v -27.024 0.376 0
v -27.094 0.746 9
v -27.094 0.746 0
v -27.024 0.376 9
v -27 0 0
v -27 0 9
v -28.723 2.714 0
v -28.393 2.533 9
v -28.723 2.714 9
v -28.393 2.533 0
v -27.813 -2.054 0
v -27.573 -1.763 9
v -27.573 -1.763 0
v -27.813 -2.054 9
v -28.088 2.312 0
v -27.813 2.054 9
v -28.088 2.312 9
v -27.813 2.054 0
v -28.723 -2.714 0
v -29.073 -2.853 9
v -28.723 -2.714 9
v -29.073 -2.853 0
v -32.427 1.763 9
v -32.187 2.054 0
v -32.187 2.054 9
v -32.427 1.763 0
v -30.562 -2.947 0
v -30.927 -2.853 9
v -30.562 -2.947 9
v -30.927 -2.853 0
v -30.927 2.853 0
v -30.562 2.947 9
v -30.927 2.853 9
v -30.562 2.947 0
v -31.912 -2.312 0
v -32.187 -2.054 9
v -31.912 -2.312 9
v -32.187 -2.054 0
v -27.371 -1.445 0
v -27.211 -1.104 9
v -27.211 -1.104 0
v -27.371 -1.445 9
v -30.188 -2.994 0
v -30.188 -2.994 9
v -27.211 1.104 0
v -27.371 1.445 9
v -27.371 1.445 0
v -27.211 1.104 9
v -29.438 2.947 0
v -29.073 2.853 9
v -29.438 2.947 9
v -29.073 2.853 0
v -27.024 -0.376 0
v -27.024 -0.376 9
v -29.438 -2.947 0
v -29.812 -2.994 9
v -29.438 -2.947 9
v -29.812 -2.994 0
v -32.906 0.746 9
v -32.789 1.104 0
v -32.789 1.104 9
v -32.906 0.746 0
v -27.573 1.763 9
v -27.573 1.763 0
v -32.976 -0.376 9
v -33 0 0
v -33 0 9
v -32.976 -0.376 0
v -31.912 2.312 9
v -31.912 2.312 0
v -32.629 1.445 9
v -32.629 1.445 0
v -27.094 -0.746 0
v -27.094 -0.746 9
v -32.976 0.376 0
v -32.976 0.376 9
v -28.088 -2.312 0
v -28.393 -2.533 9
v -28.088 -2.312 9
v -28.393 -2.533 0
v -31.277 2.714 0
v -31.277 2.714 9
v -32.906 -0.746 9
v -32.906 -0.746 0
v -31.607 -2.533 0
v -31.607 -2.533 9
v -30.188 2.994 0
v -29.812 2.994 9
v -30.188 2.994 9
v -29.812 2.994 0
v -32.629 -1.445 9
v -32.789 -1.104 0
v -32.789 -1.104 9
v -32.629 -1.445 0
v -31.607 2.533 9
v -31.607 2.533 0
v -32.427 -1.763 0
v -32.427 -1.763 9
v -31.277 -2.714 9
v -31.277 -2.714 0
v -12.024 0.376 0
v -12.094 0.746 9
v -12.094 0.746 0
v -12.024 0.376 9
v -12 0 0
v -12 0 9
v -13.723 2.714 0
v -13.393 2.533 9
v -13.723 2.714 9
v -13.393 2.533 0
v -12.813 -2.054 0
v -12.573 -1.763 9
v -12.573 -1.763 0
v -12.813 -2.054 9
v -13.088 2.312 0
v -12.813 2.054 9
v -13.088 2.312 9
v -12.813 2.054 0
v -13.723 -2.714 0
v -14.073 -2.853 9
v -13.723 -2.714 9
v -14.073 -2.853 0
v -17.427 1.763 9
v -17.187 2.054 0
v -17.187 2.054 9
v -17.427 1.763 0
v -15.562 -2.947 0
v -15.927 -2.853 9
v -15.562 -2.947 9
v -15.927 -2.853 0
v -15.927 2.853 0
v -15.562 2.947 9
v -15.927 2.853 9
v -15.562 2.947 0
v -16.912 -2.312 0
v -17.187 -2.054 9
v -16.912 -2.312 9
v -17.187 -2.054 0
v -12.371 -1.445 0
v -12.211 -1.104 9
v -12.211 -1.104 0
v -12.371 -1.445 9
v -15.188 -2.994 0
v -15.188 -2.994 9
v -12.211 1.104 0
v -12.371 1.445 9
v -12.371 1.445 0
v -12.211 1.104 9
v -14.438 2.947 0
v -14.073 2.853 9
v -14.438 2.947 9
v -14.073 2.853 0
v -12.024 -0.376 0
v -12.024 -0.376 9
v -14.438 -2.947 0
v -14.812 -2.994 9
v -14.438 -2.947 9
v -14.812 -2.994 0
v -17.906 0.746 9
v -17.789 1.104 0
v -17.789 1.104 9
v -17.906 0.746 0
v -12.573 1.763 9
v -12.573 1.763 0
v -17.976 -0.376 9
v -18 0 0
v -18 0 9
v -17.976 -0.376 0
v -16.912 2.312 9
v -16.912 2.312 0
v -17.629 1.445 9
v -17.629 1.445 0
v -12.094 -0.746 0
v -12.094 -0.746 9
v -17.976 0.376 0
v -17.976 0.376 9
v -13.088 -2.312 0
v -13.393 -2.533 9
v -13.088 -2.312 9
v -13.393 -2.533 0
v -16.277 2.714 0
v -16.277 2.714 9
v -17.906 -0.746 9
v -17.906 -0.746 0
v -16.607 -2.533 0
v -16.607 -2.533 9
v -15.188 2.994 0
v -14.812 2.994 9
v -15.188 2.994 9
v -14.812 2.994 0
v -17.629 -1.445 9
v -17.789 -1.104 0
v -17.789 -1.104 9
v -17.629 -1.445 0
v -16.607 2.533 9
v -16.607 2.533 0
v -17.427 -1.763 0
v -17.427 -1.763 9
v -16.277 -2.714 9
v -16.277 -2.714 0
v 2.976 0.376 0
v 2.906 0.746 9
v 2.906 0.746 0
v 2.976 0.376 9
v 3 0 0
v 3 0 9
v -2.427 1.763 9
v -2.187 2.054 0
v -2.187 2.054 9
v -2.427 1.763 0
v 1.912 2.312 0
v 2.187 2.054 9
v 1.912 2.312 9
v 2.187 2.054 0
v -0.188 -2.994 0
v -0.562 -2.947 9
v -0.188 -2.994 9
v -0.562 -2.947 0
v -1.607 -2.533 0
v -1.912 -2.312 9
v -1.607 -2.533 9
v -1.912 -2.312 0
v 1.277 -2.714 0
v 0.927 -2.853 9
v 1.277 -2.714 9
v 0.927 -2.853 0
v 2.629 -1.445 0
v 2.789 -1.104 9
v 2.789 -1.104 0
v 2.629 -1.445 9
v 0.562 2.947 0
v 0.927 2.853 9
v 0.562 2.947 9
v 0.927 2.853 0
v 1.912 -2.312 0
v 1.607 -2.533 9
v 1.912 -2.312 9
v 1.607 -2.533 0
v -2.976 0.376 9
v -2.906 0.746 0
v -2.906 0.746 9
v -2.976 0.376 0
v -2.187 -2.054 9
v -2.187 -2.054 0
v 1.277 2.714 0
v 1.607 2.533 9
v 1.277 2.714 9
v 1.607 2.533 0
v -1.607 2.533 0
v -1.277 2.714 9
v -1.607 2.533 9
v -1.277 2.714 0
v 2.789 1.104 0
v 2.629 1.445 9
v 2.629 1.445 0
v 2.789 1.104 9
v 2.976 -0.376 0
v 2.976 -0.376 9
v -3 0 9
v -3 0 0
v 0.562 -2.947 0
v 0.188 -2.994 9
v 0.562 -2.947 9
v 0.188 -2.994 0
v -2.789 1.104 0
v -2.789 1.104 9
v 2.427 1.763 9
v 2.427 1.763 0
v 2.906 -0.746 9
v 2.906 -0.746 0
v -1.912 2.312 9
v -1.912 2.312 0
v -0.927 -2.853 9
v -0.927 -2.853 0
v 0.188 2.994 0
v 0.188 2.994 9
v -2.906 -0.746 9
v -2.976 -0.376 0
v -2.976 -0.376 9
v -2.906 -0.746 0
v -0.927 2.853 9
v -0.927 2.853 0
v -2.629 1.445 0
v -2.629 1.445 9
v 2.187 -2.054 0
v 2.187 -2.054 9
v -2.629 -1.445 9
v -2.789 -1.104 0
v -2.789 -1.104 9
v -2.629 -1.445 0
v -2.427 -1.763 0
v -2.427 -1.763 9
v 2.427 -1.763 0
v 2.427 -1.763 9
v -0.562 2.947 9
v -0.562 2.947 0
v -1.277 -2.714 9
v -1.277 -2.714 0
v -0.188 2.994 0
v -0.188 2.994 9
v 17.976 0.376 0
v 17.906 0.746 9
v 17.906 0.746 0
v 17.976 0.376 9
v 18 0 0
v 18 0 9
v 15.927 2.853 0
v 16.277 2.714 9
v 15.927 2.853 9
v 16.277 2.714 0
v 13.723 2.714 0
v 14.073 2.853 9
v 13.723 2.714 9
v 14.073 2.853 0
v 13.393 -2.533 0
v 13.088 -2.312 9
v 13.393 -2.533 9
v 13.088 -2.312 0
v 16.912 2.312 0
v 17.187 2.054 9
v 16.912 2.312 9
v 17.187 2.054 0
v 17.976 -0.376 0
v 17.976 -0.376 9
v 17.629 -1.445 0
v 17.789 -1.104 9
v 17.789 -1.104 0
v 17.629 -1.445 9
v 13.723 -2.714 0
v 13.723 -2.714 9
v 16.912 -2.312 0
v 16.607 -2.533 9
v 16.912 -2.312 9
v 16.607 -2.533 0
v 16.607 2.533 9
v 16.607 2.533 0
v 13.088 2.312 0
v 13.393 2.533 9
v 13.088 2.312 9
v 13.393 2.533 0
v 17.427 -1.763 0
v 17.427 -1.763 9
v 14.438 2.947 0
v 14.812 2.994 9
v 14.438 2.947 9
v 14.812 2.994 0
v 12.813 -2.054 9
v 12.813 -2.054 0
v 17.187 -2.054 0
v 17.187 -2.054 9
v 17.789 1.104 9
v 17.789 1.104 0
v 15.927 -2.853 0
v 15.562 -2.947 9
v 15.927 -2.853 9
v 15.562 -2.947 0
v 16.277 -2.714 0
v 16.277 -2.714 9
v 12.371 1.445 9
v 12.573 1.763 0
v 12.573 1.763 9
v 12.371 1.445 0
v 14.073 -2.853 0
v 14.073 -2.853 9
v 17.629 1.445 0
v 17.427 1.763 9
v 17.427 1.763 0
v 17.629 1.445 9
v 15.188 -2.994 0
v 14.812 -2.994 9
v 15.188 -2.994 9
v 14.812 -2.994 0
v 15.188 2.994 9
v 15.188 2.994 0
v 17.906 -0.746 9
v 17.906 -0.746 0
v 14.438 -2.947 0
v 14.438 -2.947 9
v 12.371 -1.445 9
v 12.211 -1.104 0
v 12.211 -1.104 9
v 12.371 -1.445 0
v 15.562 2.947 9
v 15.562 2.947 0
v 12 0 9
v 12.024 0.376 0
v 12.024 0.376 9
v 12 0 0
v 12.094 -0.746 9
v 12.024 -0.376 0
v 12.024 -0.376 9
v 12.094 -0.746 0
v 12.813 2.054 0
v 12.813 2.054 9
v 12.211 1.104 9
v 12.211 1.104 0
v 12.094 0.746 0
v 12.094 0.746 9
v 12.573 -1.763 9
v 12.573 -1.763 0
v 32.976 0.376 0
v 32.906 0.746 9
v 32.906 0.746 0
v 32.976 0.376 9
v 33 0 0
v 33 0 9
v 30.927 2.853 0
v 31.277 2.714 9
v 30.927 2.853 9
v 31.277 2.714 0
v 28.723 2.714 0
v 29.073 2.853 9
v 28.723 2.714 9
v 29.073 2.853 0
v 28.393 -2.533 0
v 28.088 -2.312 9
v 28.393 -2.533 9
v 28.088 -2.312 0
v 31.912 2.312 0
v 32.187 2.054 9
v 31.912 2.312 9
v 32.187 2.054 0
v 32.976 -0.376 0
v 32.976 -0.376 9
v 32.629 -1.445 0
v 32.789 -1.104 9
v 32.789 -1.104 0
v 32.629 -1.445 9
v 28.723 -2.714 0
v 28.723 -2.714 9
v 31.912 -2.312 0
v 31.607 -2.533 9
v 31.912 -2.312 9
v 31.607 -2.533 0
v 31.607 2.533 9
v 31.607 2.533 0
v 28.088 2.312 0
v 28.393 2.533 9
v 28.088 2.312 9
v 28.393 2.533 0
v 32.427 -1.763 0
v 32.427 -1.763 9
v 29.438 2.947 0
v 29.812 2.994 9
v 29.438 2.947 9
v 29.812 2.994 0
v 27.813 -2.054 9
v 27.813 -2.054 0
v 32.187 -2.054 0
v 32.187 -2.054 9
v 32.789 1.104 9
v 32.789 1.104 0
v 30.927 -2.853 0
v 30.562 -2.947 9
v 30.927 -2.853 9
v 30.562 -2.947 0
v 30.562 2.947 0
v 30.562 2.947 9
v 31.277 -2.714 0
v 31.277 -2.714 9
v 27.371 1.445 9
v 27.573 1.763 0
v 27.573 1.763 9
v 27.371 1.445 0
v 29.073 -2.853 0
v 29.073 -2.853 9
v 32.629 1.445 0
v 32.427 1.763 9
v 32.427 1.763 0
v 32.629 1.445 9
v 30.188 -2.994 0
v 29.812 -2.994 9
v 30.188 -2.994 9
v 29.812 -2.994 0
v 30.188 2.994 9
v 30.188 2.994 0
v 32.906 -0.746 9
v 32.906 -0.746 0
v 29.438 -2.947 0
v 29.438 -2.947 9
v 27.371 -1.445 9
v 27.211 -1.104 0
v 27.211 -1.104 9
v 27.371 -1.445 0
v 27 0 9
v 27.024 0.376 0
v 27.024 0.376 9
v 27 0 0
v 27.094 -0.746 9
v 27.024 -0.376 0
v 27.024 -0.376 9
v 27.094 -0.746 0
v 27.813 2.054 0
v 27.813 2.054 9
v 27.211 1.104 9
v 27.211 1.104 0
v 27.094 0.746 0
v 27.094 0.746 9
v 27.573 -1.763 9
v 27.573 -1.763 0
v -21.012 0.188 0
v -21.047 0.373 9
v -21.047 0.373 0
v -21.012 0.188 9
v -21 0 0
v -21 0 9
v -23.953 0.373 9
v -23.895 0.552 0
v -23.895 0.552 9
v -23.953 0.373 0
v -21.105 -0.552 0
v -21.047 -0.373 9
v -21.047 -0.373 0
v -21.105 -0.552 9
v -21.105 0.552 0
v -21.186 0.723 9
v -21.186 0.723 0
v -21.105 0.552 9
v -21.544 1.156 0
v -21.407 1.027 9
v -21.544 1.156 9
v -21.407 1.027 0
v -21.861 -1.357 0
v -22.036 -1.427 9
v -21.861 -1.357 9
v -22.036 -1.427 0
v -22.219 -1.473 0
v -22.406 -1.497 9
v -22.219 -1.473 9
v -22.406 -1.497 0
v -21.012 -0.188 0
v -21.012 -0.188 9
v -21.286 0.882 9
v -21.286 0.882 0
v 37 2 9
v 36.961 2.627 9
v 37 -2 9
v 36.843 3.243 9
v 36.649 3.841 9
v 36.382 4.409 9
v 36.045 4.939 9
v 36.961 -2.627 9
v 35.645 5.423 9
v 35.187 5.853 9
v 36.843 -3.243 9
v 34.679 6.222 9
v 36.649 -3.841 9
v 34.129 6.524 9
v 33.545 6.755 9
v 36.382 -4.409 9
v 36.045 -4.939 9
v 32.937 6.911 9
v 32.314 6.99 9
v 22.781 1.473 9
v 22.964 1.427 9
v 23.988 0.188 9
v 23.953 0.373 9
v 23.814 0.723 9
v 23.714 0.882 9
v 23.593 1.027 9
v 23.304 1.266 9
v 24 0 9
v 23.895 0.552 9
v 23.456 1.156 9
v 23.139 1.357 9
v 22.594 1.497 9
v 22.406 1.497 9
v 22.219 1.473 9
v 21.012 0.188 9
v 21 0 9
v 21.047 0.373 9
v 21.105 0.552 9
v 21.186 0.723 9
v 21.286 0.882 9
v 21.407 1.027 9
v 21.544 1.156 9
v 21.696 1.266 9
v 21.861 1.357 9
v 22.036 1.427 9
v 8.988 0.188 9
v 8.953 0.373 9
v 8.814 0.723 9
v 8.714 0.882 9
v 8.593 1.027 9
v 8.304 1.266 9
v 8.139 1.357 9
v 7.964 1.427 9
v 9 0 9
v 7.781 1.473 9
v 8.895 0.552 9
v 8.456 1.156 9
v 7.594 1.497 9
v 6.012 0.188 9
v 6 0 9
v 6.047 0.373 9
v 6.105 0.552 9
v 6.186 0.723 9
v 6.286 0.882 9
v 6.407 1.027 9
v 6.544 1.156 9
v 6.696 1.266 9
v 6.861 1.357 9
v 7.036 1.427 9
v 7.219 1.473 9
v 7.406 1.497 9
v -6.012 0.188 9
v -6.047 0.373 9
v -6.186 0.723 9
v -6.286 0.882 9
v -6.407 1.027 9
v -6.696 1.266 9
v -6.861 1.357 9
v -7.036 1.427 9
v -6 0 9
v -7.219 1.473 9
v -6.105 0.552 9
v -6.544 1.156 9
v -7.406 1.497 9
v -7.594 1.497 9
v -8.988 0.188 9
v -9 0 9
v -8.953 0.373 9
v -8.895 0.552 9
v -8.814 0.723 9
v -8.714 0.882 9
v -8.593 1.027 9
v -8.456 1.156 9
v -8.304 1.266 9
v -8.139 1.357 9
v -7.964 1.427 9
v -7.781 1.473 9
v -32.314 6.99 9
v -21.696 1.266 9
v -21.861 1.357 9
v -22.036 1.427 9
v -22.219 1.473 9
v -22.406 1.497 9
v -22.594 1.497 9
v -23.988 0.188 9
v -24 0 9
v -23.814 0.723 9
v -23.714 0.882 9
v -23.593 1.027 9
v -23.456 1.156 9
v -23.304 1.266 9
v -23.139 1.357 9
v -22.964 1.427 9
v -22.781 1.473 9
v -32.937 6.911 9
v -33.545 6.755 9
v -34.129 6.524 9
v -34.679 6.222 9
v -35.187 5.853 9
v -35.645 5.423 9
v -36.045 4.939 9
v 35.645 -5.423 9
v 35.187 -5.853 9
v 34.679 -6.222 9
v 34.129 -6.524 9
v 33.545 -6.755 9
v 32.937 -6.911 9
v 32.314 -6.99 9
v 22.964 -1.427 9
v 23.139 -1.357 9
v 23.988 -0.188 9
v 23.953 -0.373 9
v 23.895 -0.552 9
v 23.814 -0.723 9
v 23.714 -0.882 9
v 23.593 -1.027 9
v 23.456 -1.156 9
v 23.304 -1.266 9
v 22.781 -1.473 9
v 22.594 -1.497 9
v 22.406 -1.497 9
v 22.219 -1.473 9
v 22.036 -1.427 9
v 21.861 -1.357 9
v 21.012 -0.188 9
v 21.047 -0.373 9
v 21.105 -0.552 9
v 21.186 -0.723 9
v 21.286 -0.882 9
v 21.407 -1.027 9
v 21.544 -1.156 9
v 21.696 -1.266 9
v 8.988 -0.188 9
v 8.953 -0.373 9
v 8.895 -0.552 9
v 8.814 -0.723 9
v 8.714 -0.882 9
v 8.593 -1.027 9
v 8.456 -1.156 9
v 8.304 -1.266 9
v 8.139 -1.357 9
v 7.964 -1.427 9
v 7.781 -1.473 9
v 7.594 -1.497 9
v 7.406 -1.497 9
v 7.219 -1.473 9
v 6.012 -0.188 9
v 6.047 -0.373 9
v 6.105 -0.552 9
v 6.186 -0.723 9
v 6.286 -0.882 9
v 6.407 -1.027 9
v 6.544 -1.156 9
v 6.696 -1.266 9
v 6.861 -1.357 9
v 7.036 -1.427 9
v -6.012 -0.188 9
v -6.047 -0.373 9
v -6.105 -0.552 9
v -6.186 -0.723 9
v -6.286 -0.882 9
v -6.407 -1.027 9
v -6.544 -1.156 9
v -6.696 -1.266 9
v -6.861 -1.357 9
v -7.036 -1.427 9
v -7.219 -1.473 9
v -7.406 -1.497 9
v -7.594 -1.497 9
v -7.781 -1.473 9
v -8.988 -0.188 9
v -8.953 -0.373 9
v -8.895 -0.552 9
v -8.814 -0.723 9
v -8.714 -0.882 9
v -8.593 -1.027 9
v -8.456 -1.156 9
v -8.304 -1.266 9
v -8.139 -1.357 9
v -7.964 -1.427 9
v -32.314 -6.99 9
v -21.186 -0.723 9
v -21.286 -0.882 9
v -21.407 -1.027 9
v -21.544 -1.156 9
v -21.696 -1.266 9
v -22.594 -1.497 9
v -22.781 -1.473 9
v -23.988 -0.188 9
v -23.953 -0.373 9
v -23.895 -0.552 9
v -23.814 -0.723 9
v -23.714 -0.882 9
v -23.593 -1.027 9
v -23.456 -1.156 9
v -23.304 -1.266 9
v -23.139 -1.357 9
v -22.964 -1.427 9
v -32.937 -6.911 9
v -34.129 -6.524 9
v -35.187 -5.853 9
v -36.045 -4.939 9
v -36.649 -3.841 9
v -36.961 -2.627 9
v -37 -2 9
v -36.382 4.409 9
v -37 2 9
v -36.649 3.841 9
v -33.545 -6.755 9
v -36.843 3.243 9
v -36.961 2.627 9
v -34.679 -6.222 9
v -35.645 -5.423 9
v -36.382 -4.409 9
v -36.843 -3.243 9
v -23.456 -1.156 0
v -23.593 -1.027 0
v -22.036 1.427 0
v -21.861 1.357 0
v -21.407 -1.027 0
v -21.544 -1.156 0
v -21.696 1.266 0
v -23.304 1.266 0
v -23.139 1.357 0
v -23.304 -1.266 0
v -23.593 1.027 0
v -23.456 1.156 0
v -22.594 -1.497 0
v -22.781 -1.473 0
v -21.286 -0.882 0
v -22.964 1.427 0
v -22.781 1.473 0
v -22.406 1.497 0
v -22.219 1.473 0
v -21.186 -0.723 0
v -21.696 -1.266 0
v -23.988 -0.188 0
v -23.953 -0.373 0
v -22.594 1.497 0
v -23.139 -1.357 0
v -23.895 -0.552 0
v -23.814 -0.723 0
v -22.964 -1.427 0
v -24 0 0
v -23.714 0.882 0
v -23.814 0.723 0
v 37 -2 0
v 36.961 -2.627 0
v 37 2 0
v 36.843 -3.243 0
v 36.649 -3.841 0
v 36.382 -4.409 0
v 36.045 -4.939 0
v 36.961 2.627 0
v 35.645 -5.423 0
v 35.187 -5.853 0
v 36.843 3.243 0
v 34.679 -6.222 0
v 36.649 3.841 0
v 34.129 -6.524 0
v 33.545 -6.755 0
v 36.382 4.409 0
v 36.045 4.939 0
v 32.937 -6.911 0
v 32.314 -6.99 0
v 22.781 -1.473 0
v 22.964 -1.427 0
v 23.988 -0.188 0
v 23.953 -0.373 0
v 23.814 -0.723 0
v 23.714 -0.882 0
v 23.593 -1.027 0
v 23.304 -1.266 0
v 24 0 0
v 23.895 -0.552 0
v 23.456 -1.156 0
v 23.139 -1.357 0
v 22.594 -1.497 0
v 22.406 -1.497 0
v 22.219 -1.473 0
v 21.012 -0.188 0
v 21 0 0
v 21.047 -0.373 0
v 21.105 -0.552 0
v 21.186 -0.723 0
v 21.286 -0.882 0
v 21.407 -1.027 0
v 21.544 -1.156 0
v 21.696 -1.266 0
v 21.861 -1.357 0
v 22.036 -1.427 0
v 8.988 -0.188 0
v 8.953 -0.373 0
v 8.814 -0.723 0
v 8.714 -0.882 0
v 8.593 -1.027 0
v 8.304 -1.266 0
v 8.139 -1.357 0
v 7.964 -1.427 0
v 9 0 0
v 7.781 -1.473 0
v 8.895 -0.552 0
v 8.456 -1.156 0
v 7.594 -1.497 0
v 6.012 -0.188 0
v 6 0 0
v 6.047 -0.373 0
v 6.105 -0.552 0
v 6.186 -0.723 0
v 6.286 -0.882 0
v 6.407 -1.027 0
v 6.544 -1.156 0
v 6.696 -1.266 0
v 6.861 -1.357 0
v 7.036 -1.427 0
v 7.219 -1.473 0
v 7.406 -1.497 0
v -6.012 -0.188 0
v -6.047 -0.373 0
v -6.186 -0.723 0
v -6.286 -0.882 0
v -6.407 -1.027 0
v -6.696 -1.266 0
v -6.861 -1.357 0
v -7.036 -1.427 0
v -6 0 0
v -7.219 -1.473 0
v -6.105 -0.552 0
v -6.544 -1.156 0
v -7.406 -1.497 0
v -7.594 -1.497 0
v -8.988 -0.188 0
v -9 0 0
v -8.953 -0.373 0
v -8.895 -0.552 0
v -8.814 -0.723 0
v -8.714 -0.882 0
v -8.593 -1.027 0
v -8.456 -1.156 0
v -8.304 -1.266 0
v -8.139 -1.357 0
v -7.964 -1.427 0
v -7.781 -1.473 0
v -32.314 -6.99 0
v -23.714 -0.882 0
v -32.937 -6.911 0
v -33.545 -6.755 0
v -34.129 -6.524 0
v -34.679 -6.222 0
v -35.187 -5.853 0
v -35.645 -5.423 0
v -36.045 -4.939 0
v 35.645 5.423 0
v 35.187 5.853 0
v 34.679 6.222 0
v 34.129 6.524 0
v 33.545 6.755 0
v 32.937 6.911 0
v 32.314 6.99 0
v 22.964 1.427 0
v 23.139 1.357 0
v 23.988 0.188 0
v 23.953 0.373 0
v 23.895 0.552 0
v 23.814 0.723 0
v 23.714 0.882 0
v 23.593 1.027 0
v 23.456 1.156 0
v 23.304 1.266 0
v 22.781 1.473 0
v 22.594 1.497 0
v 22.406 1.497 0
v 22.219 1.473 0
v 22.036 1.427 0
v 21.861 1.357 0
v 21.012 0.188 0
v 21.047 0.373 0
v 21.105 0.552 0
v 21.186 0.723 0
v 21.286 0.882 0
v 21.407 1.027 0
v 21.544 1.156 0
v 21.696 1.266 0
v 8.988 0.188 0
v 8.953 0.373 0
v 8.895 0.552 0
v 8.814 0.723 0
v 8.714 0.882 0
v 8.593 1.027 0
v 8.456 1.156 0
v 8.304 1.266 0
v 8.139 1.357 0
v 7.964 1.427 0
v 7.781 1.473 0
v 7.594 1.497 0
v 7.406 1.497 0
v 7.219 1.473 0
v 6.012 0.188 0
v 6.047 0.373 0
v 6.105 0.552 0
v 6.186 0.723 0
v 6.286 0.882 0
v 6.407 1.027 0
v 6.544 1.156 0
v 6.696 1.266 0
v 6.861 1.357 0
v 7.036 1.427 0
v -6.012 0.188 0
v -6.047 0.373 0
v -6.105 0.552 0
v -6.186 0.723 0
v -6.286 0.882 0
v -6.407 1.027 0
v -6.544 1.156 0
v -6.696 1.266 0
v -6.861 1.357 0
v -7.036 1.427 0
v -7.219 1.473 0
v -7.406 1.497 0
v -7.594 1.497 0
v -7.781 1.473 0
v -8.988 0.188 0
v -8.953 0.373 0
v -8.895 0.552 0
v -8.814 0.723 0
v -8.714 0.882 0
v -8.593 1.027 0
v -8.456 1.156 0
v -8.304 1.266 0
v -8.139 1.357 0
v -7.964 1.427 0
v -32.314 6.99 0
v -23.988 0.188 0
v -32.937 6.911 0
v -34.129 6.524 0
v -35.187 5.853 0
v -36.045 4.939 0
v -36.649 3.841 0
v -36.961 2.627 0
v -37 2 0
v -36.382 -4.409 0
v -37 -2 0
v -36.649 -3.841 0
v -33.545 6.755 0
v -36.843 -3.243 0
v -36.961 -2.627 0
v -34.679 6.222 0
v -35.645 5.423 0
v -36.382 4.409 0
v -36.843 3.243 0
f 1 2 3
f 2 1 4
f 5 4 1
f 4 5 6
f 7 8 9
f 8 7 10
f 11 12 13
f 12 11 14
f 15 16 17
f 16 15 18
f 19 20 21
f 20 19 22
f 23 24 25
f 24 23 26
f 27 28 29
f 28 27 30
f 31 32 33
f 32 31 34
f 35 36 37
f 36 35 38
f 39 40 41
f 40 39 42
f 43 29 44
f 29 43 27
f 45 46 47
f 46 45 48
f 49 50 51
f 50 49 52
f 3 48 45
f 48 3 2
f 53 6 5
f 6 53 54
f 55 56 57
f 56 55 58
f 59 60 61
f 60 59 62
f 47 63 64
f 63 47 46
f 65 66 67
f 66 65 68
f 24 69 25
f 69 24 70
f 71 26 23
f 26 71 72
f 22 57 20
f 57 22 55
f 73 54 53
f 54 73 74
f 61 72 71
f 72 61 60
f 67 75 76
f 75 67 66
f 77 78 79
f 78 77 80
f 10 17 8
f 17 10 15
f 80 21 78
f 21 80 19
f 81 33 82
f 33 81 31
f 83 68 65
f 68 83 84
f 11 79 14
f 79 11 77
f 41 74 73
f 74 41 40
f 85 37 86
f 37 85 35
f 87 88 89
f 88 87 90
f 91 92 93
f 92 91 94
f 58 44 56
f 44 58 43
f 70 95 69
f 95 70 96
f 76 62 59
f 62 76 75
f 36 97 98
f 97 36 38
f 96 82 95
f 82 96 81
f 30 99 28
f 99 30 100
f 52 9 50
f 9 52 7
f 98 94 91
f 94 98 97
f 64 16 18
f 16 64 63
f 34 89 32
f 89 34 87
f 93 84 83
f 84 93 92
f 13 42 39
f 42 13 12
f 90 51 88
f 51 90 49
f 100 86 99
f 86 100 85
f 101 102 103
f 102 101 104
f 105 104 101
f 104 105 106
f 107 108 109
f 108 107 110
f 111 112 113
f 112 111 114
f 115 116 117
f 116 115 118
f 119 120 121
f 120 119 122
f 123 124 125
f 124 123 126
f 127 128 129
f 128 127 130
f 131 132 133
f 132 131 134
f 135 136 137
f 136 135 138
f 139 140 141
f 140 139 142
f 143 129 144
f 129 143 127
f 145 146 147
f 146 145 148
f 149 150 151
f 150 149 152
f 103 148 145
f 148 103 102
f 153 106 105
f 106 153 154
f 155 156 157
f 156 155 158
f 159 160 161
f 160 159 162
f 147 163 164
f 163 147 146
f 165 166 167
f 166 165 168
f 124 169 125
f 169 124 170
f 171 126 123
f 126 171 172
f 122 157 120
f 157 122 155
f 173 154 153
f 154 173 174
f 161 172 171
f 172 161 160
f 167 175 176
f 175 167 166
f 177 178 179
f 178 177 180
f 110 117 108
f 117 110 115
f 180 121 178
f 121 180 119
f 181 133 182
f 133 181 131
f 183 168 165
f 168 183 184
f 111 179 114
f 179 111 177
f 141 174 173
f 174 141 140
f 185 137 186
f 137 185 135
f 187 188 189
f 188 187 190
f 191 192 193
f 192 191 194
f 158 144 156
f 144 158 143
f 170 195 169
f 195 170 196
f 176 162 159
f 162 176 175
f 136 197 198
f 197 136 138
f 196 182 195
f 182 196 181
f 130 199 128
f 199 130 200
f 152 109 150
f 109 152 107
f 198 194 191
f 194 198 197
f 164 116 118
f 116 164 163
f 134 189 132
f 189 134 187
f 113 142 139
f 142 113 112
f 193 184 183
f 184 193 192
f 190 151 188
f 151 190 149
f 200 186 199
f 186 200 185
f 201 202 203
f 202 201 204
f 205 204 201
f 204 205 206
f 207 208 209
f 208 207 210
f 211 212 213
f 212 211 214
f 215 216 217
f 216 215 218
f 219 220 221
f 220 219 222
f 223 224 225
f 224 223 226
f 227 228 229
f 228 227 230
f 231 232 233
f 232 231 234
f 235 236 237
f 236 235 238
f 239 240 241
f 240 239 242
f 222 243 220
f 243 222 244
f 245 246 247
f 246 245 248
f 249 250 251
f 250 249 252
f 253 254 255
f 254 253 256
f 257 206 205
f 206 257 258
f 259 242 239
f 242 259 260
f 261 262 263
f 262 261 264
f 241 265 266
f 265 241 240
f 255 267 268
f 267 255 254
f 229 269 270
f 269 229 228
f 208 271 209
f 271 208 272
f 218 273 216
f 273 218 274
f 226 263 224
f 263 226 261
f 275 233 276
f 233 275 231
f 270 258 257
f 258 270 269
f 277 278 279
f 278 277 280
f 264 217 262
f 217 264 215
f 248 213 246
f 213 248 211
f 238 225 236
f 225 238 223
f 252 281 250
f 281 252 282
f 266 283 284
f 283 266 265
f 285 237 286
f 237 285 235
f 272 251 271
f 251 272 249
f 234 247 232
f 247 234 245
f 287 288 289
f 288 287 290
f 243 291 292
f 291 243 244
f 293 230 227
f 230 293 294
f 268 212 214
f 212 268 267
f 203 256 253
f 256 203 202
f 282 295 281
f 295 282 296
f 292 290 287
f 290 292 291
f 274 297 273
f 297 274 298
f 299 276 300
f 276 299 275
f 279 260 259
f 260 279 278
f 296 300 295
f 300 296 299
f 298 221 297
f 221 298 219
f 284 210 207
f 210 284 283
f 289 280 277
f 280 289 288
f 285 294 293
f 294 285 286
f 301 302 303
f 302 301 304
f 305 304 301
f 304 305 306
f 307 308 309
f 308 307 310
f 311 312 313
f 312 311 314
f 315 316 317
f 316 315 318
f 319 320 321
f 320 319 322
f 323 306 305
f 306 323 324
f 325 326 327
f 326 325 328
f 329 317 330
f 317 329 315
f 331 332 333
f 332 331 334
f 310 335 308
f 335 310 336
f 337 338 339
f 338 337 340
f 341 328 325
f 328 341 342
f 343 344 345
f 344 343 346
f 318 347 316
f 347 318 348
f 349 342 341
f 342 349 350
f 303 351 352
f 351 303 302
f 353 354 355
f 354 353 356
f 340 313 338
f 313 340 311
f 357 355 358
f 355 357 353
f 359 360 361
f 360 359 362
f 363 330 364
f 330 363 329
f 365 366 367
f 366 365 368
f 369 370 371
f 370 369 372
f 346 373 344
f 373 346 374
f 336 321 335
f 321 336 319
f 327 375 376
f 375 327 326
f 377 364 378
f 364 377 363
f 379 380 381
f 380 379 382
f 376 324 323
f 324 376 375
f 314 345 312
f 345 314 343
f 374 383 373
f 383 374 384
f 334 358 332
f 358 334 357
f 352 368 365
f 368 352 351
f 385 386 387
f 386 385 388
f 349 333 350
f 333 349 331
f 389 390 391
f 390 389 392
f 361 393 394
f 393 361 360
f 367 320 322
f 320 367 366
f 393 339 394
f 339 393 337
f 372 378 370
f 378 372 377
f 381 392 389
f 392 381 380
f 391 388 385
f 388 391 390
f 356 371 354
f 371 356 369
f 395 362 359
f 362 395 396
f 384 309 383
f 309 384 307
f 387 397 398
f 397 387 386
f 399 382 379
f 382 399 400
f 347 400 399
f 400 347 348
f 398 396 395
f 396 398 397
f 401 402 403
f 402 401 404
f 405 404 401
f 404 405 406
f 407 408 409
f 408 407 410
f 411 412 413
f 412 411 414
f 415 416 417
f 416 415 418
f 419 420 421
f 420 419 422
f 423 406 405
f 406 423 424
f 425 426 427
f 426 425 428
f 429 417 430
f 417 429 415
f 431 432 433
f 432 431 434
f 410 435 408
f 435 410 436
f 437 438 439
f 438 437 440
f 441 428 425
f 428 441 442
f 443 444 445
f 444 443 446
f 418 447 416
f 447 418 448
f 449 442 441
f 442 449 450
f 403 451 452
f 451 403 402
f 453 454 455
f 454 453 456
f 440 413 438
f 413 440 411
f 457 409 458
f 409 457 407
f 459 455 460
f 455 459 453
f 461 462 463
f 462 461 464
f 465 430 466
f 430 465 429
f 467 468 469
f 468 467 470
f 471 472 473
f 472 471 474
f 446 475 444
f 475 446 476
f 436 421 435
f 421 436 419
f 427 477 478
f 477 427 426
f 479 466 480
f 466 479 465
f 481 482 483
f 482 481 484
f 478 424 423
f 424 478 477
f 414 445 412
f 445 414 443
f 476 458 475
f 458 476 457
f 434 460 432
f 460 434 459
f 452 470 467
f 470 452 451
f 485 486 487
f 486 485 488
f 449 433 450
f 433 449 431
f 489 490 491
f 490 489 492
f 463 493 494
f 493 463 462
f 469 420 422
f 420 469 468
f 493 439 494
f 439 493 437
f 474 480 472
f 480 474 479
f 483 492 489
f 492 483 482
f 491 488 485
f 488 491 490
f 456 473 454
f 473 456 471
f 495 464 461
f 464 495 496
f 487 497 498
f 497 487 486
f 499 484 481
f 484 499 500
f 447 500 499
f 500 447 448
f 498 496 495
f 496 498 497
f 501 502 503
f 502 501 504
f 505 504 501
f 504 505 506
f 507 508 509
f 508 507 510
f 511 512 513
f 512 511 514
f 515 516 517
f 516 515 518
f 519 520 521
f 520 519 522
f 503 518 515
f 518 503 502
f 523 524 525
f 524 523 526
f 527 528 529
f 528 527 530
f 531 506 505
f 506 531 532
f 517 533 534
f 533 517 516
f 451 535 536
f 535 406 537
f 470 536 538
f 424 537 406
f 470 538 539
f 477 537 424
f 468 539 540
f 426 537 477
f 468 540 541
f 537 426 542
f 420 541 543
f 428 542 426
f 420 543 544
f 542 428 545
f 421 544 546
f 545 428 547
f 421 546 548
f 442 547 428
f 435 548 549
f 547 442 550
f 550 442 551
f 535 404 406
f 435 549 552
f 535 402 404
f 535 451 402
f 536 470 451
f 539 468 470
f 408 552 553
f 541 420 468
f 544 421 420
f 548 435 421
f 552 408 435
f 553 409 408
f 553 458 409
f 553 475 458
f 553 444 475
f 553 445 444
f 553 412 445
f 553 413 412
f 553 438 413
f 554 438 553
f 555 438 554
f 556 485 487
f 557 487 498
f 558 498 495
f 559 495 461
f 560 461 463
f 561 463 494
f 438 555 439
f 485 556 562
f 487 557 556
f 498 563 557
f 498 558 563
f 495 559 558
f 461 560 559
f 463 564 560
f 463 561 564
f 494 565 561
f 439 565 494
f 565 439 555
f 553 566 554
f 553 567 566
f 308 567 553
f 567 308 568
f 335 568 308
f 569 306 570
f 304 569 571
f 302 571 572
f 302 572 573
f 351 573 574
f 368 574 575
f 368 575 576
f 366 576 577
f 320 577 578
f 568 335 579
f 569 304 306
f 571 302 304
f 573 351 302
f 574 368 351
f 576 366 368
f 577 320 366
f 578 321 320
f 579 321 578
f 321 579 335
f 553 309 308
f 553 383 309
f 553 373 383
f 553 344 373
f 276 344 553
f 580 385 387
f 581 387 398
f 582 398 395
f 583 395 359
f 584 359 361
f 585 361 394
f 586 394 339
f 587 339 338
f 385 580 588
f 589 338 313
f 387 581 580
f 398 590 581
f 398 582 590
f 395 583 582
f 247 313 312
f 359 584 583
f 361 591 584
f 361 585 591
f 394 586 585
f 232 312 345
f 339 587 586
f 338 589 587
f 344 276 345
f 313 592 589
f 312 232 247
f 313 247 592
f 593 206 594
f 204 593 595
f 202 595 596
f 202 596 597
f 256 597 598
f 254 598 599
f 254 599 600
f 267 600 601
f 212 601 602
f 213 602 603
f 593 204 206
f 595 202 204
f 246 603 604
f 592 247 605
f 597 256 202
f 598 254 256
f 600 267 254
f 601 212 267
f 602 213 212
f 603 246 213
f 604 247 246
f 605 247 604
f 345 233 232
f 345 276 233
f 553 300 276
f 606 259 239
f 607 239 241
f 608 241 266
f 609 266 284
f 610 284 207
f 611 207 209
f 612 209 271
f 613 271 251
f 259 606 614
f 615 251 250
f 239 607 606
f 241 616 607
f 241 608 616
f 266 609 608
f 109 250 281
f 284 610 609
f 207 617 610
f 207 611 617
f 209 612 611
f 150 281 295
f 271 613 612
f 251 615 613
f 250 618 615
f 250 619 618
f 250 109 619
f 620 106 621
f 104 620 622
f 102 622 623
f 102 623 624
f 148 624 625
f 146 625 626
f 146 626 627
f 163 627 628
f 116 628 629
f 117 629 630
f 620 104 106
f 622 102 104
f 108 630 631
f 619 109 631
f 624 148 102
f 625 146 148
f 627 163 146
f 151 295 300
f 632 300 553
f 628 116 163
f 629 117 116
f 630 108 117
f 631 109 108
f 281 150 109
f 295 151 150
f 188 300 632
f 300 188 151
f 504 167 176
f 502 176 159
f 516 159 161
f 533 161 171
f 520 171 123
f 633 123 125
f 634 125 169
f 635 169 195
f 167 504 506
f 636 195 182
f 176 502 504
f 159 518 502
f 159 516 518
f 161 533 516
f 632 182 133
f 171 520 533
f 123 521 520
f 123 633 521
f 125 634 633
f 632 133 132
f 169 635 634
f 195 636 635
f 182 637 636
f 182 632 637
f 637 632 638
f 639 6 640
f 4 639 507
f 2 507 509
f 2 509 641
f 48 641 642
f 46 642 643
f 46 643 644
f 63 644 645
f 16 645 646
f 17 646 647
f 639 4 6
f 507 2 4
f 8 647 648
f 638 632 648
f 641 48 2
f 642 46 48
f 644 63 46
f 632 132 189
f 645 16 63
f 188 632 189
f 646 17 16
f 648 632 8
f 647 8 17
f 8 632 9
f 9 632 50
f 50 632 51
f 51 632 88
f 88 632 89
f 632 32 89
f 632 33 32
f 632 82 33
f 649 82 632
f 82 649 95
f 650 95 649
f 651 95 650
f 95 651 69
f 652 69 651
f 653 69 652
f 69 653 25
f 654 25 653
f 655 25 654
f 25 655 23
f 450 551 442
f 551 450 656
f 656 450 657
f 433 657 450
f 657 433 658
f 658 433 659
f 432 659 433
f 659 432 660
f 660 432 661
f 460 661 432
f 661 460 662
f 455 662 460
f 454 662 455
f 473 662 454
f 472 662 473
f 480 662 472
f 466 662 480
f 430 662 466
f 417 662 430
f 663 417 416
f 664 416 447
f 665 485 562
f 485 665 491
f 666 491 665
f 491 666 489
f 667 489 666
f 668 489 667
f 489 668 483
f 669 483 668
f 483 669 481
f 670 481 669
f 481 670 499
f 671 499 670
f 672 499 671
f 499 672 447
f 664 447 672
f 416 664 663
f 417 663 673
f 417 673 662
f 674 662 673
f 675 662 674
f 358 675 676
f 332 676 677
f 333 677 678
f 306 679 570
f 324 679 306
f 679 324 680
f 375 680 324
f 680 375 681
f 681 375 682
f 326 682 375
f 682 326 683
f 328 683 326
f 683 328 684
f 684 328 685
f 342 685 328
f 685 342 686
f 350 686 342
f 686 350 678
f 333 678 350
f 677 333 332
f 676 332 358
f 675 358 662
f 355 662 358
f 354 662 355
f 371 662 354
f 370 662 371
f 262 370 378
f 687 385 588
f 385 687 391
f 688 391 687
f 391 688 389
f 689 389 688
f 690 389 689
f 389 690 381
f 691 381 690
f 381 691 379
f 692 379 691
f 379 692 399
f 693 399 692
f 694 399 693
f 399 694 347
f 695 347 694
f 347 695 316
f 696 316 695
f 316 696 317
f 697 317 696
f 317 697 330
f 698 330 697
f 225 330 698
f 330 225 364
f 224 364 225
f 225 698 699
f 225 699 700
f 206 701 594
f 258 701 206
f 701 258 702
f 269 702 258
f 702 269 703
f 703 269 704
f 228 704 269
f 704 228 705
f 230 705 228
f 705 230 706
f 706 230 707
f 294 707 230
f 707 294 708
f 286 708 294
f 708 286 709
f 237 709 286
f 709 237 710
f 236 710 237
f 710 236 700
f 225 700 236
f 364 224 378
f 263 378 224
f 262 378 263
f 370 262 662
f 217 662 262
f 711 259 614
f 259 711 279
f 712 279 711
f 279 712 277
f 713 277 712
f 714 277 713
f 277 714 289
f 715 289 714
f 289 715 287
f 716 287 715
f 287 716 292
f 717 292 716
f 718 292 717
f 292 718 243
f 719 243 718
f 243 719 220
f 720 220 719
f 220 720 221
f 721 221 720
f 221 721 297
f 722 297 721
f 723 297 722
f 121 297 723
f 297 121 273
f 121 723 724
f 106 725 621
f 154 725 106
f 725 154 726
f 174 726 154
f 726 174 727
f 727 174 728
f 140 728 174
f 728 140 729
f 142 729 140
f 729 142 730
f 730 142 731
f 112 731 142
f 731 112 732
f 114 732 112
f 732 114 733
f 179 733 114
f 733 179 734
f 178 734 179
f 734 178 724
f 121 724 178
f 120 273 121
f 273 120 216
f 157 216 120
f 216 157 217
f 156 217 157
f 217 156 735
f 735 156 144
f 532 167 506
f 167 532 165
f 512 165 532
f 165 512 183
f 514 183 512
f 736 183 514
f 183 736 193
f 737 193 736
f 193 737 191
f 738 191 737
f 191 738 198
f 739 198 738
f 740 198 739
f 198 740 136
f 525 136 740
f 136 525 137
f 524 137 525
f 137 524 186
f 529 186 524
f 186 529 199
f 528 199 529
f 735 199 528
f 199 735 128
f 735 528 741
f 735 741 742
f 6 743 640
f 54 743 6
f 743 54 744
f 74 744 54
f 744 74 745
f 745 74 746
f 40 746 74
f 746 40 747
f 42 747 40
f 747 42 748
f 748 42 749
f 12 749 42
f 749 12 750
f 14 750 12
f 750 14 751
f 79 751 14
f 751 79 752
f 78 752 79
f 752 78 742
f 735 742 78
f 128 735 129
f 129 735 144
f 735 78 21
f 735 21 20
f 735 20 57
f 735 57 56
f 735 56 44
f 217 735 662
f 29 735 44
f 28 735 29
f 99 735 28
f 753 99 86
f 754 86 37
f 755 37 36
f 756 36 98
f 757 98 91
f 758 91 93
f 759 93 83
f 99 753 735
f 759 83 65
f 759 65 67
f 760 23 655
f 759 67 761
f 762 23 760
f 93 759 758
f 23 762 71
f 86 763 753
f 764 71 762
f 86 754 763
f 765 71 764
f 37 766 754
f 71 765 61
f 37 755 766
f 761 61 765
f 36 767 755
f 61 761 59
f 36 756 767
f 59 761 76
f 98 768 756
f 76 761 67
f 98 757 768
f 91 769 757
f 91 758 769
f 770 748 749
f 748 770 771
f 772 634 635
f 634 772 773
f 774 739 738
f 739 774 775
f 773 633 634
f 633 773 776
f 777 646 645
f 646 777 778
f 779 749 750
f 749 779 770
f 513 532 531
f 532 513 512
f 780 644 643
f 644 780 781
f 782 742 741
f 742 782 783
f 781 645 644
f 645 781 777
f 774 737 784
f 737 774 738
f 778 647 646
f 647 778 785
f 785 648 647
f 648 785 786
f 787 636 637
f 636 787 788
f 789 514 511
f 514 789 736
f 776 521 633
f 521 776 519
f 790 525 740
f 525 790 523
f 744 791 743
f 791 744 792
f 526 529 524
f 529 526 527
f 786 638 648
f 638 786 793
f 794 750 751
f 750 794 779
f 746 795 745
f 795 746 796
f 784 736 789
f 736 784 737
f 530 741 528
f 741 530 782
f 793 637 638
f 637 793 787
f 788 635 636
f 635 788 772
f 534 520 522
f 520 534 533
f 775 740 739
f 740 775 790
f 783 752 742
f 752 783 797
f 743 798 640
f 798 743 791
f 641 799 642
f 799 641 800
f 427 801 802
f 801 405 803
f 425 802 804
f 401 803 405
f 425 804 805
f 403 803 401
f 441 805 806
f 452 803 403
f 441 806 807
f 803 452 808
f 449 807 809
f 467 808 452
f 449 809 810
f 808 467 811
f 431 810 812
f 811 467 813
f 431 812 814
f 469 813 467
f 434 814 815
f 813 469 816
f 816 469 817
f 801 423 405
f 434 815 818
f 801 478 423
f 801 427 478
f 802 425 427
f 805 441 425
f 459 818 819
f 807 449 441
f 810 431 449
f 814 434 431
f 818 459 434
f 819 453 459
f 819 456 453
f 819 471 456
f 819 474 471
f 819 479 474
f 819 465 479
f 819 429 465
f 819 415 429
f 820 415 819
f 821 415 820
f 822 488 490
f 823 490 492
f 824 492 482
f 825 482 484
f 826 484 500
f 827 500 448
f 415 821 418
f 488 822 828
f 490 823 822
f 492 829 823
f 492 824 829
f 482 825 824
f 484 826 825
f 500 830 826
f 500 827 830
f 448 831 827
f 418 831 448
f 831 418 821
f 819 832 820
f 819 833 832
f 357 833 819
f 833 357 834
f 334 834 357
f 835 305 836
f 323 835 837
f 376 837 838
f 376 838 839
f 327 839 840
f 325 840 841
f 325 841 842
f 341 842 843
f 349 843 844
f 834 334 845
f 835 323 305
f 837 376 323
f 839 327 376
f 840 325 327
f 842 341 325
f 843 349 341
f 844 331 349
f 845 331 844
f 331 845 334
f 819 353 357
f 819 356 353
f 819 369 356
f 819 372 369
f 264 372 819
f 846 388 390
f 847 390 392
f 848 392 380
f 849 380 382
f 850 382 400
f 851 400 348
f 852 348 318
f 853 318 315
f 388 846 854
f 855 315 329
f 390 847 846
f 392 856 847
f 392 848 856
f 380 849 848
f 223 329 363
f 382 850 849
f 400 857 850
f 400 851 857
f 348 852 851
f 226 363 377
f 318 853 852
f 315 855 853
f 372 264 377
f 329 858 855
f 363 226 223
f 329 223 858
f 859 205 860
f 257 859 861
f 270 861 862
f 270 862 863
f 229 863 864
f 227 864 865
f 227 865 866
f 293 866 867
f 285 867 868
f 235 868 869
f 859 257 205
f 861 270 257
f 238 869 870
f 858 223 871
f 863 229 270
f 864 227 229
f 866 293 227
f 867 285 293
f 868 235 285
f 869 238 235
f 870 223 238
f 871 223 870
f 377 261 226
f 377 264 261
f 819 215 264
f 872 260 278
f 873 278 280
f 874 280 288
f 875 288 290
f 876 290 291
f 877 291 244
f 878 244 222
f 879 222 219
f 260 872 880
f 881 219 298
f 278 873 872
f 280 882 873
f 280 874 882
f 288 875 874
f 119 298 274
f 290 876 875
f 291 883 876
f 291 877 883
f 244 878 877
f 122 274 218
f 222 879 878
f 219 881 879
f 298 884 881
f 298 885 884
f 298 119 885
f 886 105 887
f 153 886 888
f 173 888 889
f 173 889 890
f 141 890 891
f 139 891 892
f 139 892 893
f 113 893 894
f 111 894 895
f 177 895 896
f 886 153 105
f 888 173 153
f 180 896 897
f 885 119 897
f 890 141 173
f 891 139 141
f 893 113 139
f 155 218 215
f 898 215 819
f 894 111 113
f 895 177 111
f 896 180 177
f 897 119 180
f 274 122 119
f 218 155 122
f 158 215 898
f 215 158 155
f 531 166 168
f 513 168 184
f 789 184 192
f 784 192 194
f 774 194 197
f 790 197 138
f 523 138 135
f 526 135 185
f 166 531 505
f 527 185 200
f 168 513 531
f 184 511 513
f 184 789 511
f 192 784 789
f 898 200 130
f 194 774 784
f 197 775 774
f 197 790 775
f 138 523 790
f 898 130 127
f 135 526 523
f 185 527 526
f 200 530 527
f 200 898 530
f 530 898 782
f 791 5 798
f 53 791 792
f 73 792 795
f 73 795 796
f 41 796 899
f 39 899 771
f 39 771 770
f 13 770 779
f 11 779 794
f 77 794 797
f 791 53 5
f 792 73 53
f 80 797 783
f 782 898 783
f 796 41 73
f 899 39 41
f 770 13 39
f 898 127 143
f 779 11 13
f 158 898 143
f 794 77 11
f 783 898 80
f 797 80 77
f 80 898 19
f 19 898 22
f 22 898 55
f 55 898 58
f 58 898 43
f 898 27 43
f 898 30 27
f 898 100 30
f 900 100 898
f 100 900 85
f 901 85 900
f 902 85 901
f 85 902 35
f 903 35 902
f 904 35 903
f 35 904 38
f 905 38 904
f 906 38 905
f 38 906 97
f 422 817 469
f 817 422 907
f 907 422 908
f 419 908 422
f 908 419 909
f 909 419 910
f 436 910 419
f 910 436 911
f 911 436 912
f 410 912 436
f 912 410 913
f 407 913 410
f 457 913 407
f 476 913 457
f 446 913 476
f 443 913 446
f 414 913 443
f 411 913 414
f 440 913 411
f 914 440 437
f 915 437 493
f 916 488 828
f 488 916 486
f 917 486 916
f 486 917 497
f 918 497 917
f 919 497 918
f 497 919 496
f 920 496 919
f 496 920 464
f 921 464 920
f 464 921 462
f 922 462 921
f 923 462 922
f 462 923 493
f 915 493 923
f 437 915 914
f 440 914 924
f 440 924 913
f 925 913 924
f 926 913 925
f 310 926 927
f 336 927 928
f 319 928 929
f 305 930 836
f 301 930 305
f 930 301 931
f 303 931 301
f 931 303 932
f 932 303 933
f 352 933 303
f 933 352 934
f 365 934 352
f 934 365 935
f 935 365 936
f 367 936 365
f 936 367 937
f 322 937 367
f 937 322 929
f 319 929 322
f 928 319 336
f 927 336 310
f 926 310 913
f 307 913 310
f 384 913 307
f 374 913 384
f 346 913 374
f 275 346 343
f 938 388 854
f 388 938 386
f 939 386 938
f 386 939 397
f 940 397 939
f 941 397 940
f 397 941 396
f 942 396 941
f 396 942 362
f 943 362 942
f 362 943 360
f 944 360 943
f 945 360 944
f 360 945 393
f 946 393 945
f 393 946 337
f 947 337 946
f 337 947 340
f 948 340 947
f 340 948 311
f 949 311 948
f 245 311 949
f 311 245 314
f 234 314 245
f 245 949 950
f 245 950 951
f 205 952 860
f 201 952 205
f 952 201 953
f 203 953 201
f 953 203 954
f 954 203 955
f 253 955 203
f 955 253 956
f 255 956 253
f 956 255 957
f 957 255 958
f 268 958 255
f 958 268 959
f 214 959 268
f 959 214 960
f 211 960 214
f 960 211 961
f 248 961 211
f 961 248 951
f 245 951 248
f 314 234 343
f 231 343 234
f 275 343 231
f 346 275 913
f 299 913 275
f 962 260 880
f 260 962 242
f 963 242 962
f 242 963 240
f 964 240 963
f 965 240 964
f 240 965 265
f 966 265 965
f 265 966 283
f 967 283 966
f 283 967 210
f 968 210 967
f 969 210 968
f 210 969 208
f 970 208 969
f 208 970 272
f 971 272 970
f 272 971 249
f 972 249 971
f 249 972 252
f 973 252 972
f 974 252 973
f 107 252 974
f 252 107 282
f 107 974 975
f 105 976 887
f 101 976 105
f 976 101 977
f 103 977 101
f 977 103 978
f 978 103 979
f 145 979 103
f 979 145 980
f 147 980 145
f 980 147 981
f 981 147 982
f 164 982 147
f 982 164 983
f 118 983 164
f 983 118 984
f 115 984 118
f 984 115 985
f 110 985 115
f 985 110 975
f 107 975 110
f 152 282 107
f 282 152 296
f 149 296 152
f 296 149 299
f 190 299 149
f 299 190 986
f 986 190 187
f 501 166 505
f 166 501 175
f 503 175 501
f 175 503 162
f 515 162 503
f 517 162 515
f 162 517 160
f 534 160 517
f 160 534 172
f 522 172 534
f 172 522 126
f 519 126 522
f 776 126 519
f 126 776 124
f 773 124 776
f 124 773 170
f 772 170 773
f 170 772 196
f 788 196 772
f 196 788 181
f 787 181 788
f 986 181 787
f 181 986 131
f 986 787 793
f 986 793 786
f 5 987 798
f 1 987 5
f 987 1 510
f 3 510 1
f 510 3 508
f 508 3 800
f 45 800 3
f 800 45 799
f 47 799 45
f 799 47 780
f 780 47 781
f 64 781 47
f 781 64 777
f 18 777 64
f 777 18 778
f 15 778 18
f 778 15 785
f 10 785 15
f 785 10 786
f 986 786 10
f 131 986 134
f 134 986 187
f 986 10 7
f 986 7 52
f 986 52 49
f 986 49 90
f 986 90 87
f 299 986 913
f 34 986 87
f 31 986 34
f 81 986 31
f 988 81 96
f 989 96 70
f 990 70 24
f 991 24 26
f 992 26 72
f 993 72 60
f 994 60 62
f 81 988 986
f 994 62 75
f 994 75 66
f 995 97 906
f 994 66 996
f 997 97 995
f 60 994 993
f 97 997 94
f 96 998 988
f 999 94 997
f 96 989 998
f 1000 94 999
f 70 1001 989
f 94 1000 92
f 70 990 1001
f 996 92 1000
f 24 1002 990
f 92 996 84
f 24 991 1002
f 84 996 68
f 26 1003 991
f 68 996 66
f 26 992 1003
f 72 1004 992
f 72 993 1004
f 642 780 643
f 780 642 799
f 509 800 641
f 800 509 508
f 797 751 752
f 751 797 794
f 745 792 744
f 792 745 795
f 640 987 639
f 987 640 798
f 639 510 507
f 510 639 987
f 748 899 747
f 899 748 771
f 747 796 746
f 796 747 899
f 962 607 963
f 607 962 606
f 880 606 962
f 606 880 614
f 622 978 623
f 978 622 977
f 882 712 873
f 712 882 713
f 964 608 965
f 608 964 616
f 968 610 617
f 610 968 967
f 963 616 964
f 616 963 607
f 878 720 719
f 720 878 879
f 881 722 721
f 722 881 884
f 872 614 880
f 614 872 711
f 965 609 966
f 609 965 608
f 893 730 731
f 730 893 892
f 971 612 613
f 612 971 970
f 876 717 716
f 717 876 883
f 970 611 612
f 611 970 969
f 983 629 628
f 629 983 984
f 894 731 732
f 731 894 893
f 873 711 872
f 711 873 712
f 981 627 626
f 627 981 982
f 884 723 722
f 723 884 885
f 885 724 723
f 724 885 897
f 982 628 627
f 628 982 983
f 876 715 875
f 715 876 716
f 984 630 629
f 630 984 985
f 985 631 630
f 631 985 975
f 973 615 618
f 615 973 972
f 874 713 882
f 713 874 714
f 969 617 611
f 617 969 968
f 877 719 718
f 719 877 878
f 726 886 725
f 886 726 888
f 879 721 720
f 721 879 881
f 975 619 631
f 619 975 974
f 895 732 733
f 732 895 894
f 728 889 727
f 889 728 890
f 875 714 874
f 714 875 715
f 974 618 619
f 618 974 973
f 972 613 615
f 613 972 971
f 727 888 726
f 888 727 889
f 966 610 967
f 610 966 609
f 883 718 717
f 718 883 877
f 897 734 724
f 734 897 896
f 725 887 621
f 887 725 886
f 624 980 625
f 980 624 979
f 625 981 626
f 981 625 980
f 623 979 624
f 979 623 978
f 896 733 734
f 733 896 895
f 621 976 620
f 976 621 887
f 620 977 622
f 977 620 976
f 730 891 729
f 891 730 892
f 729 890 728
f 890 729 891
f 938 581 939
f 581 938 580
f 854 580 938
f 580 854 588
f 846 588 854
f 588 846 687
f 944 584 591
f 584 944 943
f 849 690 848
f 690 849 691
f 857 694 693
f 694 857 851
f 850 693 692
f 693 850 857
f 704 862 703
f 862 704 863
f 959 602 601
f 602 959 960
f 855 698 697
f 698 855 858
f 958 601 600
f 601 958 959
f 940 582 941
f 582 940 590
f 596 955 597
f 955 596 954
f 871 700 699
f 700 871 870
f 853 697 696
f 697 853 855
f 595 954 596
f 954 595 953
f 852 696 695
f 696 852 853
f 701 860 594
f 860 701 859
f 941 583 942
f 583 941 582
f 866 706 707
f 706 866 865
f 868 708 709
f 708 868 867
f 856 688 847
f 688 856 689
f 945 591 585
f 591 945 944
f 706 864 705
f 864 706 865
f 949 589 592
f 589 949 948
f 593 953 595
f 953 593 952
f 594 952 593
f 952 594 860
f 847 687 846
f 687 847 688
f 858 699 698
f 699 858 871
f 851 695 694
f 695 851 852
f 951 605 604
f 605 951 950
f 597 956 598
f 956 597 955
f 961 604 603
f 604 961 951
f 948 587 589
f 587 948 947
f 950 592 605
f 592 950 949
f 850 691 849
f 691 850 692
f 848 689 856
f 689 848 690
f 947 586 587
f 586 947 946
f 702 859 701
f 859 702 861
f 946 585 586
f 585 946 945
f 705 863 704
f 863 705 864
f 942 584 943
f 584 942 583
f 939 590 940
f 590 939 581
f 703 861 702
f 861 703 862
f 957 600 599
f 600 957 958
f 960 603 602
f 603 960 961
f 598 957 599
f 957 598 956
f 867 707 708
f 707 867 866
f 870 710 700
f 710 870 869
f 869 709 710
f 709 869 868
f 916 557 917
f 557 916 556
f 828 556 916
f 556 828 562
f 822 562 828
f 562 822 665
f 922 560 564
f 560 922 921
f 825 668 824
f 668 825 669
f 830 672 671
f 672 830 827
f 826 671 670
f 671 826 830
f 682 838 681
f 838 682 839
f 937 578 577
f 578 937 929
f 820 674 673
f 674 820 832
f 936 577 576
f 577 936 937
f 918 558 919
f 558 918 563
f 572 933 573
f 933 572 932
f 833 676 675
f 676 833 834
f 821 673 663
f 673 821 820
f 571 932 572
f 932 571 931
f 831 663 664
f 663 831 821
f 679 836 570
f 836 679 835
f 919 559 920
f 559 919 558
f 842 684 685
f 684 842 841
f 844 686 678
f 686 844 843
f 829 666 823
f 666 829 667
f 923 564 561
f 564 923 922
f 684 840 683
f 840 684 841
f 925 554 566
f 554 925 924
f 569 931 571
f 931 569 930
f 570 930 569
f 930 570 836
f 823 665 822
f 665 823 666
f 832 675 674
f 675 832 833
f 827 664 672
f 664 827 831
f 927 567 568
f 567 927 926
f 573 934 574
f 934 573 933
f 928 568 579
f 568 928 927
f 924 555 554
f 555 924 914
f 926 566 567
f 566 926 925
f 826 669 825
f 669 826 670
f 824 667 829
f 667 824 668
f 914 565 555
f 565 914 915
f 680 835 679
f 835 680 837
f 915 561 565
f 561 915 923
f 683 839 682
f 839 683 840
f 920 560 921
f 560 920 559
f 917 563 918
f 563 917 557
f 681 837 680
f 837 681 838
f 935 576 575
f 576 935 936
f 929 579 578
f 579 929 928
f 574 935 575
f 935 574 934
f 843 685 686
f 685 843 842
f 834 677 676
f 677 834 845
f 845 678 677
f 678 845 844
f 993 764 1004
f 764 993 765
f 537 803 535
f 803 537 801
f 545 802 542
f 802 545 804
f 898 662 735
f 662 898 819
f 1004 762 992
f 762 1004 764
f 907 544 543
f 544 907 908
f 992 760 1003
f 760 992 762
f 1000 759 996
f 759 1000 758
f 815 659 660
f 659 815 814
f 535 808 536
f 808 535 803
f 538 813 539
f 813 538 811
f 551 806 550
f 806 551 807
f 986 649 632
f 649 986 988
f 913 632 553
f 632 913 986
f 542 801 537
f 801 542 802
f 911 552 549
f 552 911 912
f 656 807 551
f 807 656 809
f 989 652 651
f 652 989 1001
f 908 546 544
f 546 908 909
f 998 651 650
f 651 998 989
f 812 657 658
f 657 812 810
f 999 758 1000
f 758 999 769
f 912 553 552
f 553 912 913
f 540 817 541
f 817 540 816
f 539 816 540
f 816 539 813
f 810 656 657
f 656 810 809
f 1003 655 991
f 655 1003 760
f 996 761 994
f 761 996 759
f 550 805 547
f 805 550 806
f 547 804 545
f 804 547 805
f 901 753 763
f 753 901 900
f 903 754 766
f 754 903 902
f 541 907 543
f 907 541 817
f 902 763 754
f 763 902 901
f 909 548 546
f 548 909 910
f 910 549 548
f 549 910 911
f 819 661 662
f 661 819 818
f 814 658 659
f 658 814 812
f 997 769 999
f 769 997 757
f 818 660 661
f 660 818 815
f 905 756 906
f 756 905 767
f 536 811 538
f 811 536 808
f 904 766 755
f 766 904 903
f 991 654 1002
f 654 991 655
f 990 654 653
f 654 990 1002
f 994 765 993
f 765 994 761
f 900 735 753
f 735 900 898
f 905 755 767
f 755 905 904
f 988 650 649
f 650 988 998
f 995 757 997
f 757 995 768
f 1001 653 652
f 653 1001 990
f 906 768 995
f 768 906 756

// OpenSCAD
$fn = 50;


difference() {
	union() {
		hull() {
			translate(v = [-32.0000000000, 2.0000000000, 0]) {
				cylinder(h = 9, r = 5);
			}
			translate(v = [32.0000000000, 2.0000000000, 0]) {
				cylinder(h = 9, r = 5);
			}
			translate(v = [-32.0000000000, -2.0000000000, 0]) {
				cylinder(h = 9, r = 5);
			}
			translate(v = [32.0000000000, -2.0000000000, 0]) {
				cylinder(h = 9, r = 5);
			}
		}
	}
	union() {
		translate(v = [-30.0000000000, 0.0000000000, -100.0000000000]) {
			cylinder(h = 200, r = 3.0000000000);
		}
		translate(v = [-15.0000000000, 0.0000000000, -100.0000000000]) {
			cylinder(h = 200, r = 3.0000000000);
		}
		translate(v = [0.0000000000, 0.0000000000, -100.0000000000]) {
			cylinder(h = 200, r = 3.0000000000);
		}
		translate(v = [15.0000000000, 0.0000000000, -100.0000000000]) {
			cylinder(h = 200, r = 3.0000000000);
		}
		translate(v = [30.0000000000, 0.0000000000, -100.0000000000]) {
			cylinder(h = 200, r = 3.0000000000);
		}
		translate(v = [-30.0000000000, 0.0000000000, 0]) {
			cylinder(h = 9, r = 1.5000000000);
		}
		translate(v = [-22.5000000000, 0.0000000000, 0]) {
			cylinder(h = 9, r = 1.5000000000);
		}
		translate(v = [-15.0000000000, 0.0000000000, 0]) {
			cylinder(h = 9, r = 1.5000000000);
		}
		translate(v = [-7.5000000000, 0.0000000000, 0]) {
			cylinder(h = 9, r = 1.5000000000);
		}
		cylinder(h = 9, r = 1.5000000000);
		translate(v = [7.5000000000, 0.0000000000, 0]) {
			cylinder(h = 9, r = 1.5000000000);
		}
		translate(v = [15.0000000000, 0.0000000000, 0]) {
			cylinder(h = 9, r = 1.5000000000);
		}
		translate(v = [22.5000000000, 0.0000000000, 0]) {
			cylinder(h = 9, r = 1.5000000000);
		}
		translate(v = [30.0000000000, 0.0000000000, 0]) {
			cylinder(h = 9, r = 1.5000000000);
		}
		translate(v = [-30.0000000000, 0.0000000000, 0]) {
			cylinder(h = 9, r = 1.5000000000);
		}
		translate(v = [-22.5000000000, 0.0000000000, 0]) {
			cylinder(h = 9, r = 1.5000000000);
		}
		translate(v = [-15.0000000000, 0.0000000000, 0]) {
			cylinder(h = 9, r = 1.5000000000);
		}
		translate(v = [-7.5000000000, 0.0000000000, 0]) {
			cylinder(h = 9, r = 1.5000000000);
		}
		cylinder(h = 9, r = 1.5000000000);
		translate(v = [7.5000000000, 0.0000000000, 0]) {
			cylinder(h = 9, r = 1.5000000000);
		}
		translate(v = [15.0000000000, 0.0000000000, 0]) {
			cylinder(h = 9, r = 1.5000000000);
		}
		translate(v = [22.5000000000, 0.0000000000, 0]) {
			cylinder(h = 9, r = 1.5000000000);
		}
		translate(v = [30.0000000000, 0.0000000000, 0]) {
			cylinder(h = 9, r = 1.5000000000);
		}
		translate(v = [-30.0000000000, 0.0000000000, 0]) {
			cylinder(h = 9, r = 1.5000000000);
		}
		translate(v = [-22.5000000000, 0.0000000000, 0]) {
			cylinder(h = 9, r = 1.5000000000);
		}
		translate(v = [-15.0000000000, 0.0000000000, 0]) {
			cylinder(h = 9, r = 1.5000000000);
		}
		translate(v = [-7.5000000000, 0.0000000000, 0]) {
			cylinder(h = 9, r = 1.5000000000);
		}
		cylinder(h = 9, r = 1.5000000000);
		translate(v = [7.5000000000, 0.0000000000, 0]) {
			cylinder(h = 9, r = 1.5000000000);
		}
		translate(v = [15.0000000000, 0.0000000000, 0]) {
			cylinder(h = 9, r = 1.5000000000);
		}
		translate(v = [22.5000000000, 0.0000000000, 0]) {
			cylinder(h = 9, r = 1.5000000000);
		}
		translate(v = [30.0000000000, 0.0000000000, 0]) {
			cylinder(h = 9, r = 1.5000000000);
		}
	}
}
